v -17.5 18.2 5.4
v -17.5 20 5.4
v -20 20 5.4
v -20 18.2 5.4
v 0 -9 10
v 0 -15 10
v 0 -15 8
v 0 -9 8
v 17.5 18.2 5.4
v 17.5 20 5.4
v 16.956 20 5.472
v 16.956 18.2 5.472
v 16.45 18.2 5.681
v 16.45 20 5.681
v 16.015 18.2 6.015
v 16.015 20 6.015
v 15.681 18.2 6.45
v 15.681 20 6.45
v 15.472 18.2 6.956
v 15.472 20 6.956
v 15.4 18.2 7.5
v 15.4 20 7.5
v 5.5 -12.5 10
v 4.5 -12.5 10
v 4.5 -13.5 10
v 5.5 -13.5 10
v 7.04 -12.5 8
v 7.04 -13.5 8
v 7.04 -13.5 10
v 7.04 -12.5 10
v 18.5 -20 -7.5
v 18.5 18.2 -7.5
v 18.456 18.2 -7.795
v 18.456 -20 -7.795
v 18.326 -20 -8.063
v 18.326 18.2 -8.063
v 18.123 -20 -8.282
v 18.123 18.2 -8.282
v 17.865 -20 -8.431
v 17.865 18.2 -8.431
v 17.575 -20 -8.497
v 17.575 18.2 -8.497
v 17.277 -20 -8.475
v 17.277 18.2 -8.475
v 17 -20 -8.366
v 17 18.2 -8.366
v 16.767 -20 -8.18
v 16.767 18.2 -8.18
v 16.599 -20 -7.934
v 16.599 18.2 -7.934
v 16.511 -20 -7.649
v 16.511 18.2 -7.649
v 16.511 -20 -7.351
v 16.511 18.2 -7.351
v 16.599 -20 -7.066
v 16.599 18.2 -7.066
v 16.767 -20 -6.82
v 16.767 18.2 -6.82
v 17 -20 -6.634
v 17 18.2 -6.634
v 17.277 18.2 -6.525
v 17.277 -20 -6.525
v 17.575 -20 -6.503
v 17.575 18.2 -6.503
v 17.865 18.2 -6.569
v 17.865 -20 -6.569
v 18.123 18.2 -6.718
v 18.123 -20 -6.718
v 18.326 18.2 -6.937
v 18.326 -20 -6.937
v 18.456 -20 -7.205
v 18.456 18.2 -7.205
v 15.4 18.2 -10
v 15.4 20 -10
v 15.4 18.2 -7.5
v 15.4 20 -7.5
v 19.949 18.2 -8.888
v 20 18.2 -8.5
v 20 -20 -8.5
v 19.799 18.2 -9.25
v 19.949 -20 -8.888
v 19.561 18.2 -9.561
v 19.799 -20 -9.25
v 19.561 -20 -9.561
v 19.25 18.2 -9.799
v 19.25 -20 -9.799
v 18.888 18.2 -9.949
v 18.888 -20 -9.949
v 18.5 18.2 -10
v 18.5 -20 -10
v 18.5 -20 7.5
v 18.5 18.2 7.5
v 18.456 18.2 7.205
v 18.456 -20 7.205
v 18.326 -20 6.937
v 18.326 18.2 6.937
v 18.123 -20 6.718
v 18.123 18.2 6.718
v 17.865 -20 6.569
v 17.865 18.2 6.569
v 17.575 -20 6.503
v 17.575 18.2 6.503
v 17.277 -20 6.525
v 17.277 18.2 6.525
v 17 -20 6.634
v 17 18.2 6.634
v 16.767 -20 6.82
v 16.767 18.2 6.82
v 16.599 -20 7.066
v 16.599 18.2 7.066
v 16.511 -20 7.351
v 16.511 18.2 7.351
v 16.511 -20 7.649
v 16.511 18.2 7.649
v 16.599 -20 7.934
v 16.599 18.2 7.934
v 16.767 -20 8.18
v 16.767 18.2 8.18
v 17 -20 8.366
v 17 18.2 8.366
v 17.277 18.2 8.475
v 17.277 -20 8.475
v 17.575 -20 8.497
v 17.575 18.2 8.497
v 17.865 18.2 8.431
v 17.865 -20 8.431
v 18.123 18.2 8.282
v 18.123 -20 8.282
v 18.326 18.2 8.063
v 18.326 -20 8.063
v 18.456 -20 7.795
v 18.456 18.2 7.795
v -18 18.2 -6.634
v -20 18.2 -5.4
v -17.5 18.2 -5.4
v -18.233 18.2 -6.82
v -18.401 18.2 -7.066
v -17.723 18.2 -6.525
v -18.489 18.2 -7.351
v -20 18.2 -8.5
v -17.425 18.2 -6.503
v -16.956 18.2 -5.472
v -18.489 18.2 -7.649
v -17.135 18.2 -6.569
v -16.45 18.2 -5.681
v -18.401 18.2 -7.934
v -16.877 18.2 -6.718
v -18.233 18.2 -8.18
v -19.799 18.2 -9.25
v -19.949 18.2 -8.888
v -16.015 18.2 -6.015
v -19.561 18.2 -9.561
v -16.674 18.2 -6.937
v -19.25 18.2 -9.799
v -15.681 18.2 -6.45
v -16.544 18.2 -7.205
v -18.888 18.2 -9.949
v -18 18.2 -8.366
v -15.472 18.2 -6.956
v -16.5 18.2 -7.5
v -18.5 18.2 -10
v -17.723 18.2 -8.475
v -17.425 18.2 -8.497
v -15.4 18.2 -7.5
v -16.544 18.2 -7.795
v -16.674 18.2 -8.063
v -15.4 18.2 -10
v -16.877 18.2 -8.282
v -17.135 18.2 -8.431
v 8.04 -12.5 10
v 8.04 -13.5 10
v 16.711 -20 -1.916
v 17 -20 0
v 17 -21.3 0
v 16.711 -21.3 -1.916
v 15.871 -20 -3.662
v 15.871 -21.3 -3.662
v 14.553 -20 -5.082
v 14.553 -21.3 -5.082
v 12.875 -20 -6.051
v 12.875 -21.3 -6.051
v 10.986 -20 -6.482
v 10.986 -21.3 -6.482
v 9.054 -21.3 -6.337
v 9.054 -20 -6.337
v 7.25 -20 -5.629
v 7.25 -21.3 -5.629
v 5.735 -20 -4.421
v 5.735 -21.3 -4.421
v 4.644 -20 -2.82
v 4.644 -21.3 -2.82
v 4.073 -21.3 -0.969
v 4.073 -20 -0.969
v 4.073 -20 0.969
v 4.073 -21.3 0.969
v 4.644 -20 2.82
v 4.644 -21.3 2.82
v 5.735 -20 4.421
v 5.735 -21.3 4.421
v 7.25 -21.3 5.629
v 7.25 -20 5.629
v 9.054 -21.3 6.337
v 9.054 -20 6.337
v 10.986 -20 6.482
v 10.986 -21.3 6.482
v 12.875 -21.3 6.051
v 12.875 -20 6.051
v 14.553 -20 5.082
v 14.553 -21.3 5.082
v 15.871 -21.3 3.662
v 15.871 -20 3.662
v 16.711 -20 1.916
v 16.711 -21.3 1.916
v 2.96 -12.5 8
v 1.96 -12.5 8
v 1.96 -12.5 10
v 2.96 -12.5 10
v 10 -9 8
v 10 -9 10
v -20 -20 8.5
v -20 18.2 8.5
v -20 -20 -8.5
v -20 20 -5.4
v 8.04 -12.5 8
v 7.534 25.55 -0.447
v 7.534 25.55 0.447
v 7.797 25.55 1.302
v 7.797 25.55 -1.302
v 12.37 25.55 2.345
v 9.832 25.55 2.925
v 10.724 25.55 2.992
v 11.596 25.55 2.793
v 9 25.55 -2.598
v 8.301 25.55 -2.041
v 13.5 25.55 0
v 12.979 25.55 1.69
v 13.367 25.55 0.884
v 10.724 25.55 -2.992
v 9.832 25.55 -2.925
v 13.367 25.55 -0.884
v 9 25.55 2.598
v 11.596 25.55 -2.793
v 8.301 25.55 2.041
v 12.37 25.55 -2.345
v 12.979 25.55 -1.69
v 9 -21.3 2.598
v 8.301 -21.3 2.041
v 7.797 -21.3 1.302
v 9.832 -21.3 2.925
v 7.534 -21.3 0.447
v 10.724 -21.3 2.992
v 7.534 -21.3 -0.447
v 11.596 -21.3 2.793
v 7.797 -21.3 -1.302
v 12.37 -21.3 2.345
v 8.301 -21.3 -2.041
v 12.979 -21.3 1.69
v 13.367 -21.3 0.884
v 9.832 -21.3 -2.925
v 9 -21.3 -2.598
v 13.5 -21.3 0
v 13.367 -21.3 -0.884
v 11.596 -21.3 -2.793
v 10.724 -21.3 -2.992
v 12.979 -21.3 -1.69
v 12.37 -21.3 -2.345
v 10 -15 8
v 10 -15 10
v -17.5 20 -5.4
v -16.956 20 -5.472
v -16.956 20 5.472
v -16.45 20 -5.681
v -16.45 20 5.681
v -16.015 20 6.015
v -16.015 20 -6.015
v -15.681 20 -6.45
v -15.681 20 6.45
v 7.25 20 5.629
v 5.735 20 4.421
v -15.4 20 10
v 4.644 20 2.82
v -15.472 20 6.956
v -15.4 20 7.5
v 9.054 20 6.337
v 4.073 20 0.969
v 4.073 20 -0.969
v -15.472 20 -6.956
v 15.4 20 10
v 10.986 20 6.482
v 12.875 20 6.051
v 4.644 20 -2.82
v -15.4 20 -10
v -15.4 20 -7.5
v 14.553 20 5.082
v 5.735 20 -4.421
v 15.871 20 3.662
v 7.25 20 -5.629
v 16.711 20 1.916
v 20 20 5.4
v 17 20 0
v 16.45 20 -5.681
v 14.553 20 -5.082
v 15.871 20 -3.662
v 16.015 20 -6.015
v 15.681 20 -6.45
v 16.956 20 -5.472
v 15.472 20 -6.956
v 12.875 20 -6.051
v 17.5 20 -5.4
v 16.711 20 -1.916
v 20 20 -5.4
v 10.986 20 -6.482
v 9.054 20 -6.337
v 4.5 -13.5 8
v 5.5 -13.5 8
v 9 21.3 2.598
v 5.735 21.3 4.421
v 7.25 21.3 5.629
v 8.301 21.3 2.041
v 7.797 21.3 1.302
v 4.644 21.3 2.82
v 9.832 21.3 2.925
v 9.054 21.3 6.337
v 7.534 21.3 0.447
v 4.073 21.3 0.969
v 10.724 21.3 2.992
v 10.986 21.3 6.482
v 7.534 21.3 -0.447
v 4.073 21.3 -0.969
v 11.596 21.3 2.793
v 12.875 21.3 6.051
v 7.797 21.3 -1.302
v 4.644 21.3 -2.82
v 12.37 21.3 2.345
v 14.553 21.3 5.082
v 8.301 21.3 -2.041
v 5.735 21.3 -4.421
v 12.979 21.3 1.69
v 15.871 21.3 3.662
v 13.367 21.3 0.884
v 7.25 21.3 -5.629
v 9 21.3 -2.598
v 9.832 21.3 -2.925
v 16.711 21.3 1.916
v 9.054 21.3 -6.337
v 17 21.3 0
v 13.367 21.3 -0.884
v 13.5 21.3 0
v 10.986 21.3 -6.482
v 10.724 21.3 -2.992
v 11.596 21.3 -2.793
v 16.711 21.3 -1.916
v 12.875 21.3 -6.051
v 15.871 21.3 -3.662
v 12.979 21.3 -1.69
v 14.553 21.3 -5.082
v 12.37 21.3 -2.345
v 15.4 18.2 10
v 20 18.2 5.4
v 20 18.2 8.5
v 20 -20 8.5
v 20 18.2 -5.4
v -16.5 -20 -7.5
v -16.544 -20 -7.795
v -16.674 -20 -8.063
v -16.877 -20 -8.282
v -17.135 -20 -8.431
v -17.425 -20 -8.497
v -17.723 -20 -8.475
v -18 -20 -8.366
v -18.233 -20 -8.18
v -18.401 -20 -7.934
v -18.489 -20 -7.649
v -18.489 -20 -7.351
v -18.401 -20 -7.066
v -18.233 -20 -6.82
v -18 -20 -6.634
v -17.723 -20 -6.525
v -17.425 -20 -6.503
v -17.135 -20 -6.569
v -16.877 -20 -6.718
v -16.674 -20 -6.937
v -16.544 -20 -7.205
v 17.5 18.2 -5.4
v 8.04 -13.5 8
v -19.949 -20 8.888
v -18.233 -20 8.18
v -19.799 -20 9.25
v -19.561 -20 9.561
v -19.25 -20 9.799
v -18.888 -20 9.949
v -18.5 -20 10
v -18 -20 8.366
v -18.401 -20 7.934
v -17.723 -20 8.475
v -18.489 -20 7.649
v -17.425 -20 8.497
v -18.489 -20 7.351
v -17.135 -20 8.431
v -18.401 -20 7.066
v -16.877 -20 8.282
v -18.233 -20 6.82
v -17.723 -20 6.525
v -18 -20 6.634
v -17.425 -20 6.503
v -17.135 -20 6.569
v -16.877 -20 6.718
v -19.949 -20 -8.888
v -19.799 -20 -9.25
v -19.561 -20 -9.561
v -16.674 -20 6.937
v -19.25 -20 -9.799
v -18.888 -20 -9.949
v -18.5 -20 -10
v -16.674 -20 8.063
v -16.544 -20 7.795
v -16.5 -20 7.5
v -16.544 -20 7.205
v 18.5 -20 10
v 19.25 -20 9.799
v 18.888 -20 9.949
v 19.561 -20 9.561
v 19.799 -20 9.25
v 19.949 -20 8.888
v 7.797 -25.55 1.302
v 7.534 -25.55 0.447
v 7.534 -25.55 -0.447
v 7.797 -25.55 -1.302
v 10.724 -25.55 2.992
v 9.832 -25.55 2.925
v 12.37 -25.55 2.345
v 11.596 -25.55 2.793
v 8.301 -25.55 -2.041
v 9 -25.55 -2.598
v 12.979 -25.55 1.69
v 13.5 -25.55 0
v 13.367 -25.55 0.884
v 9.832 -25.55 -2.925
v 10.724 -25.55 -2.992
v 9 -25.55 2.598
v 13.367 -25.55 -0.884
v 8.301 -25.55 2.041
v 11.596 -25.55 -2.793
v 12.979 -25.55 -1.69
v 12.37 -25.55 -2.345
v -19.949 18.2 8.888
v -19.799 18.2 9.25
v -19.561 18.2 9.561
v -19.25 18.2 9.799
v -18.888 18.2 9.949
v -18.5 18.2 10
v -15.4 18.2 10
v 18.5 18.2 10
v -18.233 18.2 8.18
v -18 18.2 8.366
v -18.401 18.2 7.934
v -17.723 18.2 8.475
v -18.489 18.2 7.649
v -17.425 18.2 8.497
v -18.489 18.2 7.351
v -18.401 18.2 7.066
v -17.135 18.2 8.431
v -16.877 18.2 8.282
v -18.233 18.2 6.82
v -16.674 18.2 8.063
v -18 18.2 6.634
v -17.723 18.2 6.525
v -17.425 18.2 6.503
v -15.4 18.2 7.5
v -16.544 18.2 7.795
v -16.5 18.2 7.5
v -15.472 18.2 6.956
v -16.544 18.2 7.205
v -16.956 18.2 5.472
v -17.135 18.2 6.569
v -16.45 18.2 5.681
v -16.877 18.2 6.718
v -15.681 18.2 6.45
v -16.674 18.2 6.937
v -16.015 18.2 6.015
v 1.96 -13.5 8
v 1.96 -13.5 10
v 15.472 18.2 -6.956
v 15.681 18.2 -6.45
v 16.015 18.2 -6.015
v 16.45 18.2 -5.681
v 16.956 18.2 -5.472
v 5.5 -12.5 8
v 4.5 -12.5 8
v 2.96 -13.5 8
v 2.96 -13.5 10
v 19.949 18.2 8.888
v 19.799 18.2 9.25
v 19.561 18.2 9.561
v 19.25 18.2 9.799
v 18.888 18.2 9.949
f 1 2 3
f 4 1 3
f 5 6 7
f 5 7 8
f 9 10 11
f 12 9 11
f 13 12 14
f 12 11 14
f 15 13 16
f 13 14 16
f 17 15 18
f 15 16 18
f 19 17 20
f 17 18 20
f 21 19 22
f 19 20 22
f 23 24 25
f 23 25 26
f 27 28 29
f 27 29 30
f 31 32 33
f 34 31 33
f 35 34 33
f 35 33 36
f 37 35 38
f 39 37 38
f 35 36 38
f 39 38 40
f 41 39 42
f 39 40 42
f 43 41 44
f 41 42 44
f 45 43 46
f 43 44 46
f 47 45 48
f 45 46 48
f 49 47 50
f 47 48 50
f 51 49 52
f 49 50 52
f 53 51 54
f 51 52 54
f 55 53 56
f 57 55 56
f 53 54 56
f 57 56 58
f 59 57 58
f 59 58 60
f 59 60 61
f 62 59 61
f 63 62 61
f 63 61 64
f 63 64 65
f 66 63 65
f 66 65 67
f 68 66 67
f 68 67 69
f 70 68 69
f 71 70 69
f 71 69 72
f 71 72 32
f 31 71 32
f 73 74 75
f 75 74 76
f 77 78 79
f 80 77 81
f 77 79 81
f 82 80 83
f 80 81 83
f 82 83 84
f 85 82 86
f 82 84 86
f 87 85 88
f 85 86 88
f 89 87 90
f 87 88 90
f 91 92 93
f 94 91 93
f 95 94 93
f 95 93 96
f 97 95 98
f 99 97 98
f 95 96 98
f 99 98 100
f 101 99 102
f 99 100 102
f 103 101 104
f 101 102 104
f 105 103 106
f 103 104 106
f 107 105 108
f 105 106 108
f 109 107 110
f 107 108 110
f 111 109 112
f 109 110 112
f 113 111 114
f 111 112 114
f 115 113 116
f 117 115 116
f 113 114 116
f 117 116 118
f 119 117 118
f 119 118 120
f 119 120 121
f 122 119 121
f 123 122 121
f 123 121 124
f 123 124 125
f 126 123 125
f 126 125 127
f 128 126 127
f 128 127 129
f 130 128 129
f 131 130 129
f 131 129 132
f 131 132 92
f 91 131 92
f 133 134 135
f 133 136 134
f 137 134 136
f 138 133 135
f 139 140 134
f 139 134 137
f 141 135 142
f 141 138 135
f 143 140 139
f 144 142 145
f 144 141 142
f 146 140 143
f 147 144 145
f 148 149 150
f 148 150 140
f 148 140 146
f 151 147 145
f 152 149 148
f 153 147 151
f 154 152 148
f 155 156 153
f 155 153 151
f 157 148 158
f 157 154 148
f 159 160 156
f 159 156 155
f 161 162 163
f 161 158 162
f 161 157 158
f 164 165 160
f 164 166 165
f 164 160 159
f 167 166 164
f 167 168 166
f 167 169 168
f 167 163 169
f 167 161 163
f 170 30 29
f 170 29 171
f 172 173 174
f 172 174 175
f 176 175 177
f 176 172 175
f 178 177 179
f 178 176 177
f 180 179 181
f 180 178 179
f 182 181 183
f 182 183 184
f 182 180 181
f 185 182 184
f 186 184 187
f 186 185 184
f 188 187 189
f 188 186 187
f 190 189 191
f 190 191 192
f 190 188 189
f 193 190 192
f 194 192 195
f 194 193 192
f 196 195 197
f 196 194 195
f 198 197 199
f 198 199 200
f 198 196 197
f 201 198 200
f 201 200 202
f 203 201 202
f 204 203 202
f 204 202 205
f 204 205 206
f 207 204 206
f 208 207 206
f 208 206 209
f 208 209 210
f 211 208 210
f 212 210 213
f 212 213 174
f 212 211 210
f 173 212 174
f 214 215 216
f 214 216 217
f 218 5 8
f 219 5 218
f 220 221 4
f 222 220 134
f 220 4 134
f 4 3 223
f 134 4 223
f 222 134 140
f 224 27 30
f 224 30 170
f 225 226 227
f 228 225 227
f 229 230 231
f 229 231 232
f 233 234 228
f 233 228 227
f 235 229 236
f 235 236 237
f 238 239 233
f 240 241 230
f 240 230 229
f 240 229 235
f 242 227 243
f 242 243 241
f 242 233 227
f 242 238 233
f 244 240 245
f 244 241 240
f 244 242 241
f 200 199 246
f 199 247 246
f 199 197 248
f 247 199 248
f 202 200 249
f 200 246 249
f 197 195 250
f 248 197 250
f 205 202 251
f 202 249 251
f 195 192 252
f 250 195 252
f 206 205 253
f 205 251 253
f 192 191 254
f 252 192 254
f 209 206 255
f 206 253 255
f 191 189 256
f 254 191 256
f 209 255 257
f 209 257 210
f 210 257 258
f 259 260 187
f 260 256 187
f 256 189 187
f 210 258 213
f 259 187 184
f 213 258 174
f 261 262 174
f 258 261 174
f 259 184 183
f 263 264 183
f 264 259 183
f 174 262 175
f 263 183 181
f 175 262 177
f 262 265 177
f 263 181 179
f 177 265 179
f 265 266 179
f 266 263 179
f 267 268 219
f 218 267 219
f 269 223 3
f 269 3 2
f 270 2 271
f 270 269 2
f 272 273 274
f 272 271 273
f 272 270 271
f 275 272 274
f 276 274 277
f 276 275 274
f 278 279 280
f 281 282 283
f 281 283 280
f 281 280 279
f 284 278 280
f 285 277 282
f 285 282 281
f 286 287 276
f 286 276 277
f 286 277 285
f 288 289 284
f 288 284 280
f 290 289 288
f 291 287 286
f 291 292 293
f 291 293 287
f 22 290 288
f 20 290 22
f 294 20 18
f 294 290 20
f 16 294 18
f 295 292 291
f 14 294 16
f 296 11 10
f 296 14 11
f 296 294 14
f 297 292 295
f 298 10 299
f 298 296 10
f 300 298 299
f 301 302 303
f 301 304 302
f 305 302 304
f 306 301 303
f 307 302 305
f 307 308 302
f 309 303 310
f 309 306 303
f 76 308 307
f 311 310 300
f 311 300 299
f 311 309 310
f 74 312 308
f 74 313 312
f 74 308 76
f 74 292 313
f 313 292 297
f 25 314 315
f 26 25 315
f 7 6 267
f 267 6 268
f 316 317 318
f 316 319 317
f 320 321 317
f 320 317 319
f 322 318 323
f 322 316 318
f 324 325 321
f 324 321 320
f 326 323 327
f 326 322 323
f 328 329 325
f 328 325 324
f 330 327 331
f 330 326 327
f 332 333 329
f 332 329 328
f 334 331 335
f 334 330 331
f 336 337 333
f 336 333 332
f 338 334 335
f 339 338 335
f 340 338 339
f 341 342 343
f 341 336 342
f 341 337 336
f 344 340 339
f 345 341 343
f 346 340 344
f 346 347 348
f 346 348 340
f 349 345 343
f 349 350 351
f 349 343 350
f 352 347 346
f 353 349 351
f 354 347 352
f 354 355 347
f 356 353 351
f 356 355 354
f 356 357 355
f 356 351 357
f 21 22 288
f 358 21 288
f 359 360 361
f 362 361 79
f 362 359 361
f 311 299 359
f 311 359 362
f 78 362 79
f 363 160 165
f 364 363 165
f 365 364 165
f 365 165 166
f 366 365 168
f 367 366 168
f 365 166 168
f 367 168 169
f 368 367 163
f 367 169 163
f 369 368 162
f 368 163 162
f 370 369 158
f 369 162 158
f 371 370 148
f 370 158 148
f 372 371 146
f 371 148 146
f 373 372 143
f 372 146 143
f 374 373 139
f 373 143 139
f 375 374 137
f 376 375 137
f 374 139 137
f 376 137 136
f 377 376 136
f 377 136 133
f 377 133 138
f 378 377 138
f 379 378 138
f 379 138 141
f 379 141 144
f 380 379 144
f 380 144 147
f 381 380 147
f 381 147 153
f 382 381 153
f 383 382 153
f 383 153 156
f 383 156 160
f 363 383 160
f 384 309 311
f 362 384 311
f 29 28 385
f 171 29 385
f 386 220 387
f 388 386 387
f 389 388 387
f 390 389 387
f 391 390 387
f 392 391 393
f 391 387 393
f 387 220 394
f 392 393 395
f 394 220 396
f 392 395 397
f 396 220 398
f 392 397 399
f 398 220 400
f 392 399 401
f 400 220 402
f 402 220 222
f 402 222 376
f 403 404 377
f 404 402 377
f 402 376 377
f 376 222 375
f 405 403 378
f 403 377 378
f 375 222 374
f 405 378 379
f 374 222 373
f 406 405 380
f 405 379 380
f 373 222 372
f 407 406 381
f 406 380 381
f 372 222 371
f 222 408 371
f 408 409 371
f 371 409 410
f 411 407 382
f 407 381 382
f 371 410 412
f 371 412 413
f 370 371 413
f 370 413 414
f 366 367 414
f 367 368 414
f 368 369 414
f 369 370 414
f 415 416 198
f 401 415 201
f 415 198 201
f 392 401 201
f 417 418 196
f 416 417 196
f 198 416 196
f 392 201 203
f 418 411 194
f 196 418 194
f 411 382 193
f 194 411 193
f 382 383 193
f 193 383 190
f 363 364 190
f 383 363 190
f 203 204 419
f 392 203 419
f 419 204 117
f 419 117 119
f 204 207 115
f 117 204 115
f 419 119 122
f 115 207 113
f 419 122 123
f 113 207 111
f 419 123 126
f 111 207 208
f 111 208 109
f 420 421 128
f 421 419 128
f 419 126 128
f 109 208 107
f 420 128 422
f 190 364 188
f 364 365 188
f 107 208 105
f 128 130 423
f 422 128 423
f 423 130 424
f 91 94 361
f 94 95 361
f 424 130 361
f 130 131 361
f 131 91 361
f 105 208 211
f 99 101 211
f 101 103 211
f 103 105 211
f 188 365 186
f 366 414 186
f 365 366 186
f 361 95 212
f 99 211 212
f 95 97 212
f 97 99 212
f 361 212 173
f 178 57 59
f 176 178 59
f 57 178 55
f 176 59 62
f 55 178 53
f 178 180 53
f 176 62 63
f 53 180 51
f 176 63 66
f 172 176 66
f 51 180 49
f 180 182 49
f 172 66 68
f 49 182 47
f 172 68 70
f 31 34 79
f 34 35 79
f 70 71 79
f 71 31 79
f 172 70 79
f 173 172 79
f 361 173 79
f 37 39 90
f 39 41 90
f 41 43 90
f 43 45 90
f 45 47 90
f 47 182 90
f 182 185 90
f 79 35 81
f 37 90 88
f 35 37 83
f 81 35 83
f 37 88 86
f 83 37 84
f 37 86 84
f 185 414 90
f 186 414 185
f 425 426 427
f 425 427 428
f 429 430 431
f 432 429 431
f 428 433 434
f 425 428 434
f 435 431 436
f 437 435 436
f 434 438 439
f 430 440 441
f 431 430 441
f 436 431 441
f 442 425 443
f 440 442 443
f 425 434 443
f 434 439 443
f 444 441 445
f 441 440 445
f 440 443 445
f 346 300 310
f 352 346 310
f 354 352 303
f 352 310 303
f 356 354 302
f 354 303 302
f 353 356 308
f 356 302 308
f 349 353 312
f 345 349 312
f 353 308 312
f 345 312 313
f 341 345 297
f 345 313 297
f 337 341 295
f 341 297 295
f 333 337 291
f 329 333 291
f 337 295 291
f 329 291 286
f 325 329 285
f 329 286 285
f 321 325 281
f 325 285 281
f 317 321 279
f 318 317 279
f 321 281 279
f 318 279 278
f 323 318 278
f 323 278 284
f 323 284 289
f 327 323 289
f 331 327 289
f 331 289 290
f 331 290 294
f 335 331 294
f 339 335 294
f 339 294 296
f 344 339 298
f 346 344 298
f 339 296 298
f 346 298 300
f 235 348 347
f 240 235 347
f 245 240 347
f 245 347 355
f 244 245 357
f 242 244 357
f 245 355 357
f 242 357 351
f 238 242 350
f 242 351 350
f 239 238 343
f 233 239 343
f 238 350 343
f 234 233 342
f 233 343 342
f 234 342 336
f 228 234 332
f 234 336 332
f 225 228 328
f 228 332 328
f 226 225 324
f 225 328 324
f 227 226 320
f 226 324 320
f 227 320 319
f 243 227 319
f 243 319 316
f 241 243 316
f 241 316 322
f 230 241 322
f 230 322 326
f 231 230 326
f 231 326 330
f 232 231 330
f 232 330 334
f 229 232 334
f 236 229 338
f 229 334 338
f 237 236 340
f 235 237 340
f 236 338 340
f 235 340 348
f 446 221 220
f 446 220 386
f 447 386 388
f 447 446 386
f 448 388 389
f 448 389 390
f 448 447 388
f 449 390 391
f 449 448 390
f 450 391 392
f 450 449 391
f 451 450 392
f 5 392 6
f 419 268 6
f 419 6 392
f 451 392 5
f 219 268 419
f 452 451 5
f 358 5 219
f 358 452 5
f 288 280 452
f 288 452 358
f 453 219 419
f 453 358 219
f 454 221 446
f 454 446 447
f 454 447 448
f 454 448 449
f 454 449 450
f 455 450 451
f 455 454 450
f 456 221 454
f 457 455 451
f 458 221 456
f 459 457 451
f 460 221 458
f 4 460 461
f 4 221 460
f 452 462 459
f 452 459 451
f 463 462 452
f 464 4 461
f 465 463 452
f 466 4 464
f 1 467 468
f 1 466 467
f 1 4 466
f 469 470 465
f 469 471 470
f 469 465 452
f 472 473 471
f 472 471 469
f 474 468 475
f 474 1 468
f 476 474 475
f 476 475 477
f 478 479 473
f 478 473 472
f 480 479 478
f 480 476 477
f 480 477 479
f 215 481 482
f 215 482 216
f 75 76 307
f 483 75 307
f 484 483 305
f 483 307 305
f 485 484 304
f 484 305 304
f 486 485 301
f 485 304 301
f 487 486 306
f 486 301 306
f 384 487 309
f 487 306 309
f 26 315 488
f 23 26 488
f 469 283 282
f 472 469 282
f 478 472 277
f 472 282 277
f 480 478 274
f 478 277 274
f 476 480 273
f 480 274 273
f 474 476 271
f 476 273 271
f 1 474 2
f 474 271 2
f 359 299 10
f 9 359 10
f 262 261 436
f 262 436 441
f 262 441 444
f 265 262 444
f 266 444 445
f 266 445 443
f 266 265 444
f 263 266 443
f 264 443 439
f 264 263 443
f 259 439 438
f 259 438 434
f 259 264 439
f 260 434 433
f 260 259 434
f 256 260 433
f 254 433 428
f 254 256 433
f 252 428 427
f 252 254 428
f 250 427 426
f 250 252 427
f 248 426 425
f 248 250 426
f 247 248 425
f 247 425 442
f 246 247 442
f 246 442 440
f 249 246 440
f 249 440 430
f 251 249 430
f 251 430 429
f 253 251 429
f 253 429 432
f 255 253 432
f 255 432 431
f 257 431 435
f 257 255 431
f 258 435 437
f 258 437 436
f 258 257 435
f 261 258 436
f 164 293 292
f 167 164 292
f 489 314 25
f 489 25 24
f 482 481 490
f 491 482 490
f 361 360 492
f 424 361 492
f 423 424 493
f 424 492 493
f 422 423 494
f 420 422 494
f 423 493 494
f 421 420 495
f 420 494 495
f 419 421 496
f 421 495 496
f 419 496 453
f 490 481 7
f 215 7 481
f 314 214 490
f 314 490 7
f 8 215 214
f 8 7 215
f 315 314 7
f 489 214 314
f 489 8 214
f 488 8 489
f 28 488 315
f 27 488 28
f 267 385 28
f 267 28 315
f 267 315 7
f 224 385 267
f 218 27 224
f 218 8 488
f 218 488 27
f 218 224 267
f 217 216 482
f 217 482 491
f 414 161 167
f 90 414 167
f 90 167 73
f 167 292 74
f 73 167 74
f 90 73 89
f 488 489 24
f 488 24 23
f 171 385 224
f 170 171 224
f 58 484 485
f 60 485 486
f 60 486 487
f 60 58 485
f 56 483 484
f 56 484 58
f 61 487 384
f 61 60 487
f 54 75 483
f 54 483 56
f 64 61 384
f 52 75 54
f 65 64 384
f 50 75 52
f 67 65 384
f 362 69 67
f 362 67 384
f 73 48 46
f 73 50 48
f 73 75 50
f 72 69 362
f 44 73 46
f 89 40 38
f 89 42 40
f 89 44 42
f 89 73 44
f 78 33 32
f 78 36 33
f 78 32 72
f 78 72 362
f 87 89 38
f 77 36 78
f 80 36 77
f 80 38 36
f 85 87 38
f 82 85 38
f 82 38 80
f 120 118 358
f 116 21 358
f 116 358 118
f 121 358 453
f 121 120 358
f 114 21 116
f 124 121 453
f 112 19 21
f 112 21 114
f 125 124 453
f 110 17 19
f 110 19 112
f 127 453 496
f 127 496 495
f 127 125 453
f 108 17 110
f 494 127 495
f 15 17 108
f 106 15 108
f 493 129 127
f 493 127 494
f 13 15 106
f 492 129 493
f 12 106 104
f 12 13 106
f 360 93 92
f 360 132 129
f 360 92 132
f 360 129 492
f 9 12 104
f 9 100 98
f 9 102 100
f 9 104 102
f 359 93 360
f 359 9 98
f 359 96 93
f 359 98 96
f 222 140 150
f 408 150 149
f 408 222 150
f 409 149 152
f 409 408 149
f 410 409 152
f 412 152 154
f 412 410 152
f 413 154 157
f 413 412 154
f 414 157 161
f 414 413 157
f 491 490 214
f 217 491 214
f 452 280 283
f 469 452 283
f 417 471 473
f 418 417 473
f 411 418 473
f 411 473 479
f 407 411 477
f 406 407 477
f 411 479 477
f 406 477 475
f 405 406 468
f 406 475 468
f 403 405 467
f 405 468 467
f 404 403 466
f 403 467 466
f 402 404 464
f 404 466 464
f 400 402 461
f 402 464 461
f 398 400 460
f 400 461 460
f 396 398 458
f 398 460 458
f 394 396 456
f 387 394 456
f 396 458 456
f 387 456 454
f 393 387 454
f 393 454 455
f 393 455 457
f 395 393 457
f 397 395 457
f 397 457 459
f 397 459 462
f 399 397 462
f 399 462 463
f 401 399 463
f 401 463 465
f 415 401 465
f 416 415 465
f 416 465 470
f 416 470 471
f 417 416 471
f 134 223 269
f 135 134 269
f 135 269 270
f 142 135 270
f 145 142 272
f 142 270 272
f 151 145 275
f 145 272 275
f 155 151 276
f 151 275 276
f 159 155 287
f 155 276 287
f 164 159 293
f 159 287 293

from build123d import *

# Parameters (mm, degrees)
SKETCH_1_W          = 40
SKETCH_1_H          = 20
EXTRUDE_1_DEPTH     = 20
FILLET_1_R          = 1.5
SKETCH_2_R          = 1
CUT_EXTRUDE_1_DEPTH = 41
SKETCH_3_R          = 2.1
SKETCH_3_R_2        = 1
CUT_EXTRUDE_2_DEPTH = 1.8
SKETCH_4_R          = 6.5
EXTRUDE_2_DEPTH     = 1.3
SKETCH_5_R          = 3
EXTRUDE_3_DEPTH     = 4.25
SKETCH_6_W          = 10
SKETCH_6_H          = 6
CUT_EXTRUDE_3_DEPTH = 2
SKETCH_7_W          = 1
SKETCH_7_H          = 1
EXTRUDE_4_DEPTH     = 2


with BuildPart() as part:
    # Эскиз1 → Бобышка-Вытянуть1 (new body, symmetric)
    with BuildSketch(Plane(origin=(0, 0, 0), x_dir=(1, 0, 0), z_dir=(0, 1, 0))):
        Rectangle(SKETCH_1_W, SKETCH_1_H)
    extrude(amount=EXTRUDE_1_DEPTH, both=True)

    # Скругление1
    fillet_1_edges = [part.edges().sort_by_distance(p)[0] for p in [
        (20, 0, 10),
        (-20, 0, 10),
        (-20, 0, -10),
        (20, 0, -10),
    ]]
    fillet(fillet_1_edges, radius=FILLET_1_R)

    # Эскиз2 → Вырез-Вытянуть1 (cut, through all)
    with BuildSketch(Plane(origin=(0, 20, 0), x_dir=(1, 0, 0), z_dir=(0, 1, 0))):
        with Locations((17.5, 7.5)):
            Circle(SKETCH_2_R)
        with Locations((17.5, -7.5)):
            Circle(SKETCH_2_R)
        with Locations((-17.5, -7.5)):
            Circle(SKETCH_2_R)
        with Locations((-17.5, 7.5)):
            Circle(SKETCH_2_R)
    extrude(amount=-CUT_EXTRUDE_1_DEPTH, mode=Mode.SUBTRACT)

    # Эскиз3 → Вырез-Вытянуть2 (cut)
    with BuildSketch(Plane(origin=(0, 20, 0), x_dir=(1, 0, 0), z_dir=(0, 1, 0))):
        with Locations((-17.5, 7.5)):
            Circle(SKETCH_3_R)
        with Locations((-17.5, 7.5)):
            Circle(SKETCH_3_R_2, mode=Mode.SUBTRACT)
        with BuildLine():
            Line((-20, 8.5), (-20, 5.4))
            Line((-20, 5.4), (-17.5, 5.4))
            ThreePointArc((-17.5, 5.4), (-18.98492424, 8.98492424), (-15.4, 7.5))
            Line((-15.4, 7.5), (-15.4, 10))
            Line((-15.4, 10), (-18.5, 10))
            ThreePointArc((-18.5, 10), (-19.560660172, 9.560660172), (-20, 8.5))
        make_face()
        with Locations((-17.5, -7.5)):
            Circle(SKETCH_3_R)
        with Locations((-17.5, -7.5)):
            Circle(SKETCH_3_R_2, mode=Mode.SUBTRACT)
        with BuildLine():
            Line((-17.5, -5.4), (-20, -5.4))
            Line((-20, -5.4), (-20, -8.5))
            ThreePointArc((-20, -8.5), (-19.560660172, -9.560660172), (-18.5, -10))
            Line((-18.5, -10), (-15.4, -10))
            Line((-15.4, -10), (-15.4, -7.5))
            ThreePointArc((-15.4, -7.5), (-18.98492424, -8.98492424), (-17.5, -5.4))
        make_face()
        with BuildLine():
            Line((15.4, -7.499999992), (15.4, -10))
            Line((15.4, -10), (18.5, -10))
            ThreePointArc((18.5, -10), (19.560660172, -9.560660172), (20, -8.5))
            Line((20, -8.5), (20, -5.4))
            Line((20, -5.4), (17.5, -5.4))
            ThreePointArc((17.5, -5.4), (18.98492424, -6.01507576), (19.6, -7.5))
            ThreePointArc((19.6, -7.5), (17.499999996, -9.6), (15.4, -7.499999992))
        make_face()
        with Locations((17.5, -7.5)):
            Circle(SKETCH_3_R)
        with Locations((17.5, -7.5)):
            Circle(SKETCH_3_R_2, mode=Mode.SUBTRACT)
        with BuildLine():
            Line((18.5, 10), (15.4, 10))
            Line((15.4, 10), (15.4, 7.500000012))
            ThreePointArc((15.4, 7.500000012), (17.500000006, 9.6), (19.6, 7.5))
            ThreePointArc((19.6, 7.5), (18.98492424, 6.01507576), (17.5, 5.4))
            Line((17.5, 5.4), (20, 5.4))
            Line((20, 5.4), (20, 8.5))
            ThreePointArc((20, 8.5), (19.560660172, 9.560660172), (18.5, 10))
        make_face()
        with Locations((17.5, 7.5)):
            Circle(SKETCH_3_R)
        with Locations((17.5, 7.5)):
            Circle(SKETCH_3_R_2, mode=Mode.SUBTRACT)
    extrude(amount=-CUT_EXTRUDE_2_DEPTH, mode=Mode.SUBTRACT)

    # Эскиз4 → Бобышка-Вытянуть2 (add)
    with BuildSketch(Plane(origin=(0, 20, 0), x_dir=(1, 0, 0), z_dir=(0, 1, 0))):
        with Locations((10.5, 0)):
            Circle(SKETCH_4_R)
    extrude_2 = extrude(amount=EXTRUDE_2_DEPTH)

    # Эскиз5 → Бобышка-Вытянуть3 (add)
    with BuildSketch(Plane(origin=(0, 21.3, 0), x_dir=(1, 0, 0), z_dir=(0, 1, 0))):
        with Locations((10.5, 0)):
            Circle(SKETCH_5_R)
    extrude_3 = extrude(amount=EXTRUDE_3_DEPTH)

    # Зеркальное отражение1: Бобышка-Вытянуть2, Бобышка-Вытянуть3 across plane
    add(extrude_2.mirror(Plane.ZX))
    add(extrude_3.mirror(Plane.ZX))

    # Эскиз6 → Вырез-Вытянуть3 (cut)
    with BuildSketch(Plane.XY.offset(10)):
        with Locations((5, -12)):
            Rectangle(SKETCH_6_W, SKETCH_6_H)
    extrude(amount=-CUT_EXTRUDE_3_DEPTH, mode=Mode.SUBTRACT)

    # Эскиз7 → Бобышка-Вытянуть4 (add)
    with BuildSketch(Plane.XY.offset(8)):
        with Locations((2.46, -13)):
            Rectangle(SKETCH_7_W, SKETCH_7_H)
        with Locations((5, -13)):
            Rectangle(SKETCH_7_W, SKETCH_7_H)
        with Locations((7.54, -13)):
            Rectangle(SKETCH_7_W, SKETCH_7_H)
    extrude(amount=EXTRUDE_4_DEPTH)


solid = part.part
